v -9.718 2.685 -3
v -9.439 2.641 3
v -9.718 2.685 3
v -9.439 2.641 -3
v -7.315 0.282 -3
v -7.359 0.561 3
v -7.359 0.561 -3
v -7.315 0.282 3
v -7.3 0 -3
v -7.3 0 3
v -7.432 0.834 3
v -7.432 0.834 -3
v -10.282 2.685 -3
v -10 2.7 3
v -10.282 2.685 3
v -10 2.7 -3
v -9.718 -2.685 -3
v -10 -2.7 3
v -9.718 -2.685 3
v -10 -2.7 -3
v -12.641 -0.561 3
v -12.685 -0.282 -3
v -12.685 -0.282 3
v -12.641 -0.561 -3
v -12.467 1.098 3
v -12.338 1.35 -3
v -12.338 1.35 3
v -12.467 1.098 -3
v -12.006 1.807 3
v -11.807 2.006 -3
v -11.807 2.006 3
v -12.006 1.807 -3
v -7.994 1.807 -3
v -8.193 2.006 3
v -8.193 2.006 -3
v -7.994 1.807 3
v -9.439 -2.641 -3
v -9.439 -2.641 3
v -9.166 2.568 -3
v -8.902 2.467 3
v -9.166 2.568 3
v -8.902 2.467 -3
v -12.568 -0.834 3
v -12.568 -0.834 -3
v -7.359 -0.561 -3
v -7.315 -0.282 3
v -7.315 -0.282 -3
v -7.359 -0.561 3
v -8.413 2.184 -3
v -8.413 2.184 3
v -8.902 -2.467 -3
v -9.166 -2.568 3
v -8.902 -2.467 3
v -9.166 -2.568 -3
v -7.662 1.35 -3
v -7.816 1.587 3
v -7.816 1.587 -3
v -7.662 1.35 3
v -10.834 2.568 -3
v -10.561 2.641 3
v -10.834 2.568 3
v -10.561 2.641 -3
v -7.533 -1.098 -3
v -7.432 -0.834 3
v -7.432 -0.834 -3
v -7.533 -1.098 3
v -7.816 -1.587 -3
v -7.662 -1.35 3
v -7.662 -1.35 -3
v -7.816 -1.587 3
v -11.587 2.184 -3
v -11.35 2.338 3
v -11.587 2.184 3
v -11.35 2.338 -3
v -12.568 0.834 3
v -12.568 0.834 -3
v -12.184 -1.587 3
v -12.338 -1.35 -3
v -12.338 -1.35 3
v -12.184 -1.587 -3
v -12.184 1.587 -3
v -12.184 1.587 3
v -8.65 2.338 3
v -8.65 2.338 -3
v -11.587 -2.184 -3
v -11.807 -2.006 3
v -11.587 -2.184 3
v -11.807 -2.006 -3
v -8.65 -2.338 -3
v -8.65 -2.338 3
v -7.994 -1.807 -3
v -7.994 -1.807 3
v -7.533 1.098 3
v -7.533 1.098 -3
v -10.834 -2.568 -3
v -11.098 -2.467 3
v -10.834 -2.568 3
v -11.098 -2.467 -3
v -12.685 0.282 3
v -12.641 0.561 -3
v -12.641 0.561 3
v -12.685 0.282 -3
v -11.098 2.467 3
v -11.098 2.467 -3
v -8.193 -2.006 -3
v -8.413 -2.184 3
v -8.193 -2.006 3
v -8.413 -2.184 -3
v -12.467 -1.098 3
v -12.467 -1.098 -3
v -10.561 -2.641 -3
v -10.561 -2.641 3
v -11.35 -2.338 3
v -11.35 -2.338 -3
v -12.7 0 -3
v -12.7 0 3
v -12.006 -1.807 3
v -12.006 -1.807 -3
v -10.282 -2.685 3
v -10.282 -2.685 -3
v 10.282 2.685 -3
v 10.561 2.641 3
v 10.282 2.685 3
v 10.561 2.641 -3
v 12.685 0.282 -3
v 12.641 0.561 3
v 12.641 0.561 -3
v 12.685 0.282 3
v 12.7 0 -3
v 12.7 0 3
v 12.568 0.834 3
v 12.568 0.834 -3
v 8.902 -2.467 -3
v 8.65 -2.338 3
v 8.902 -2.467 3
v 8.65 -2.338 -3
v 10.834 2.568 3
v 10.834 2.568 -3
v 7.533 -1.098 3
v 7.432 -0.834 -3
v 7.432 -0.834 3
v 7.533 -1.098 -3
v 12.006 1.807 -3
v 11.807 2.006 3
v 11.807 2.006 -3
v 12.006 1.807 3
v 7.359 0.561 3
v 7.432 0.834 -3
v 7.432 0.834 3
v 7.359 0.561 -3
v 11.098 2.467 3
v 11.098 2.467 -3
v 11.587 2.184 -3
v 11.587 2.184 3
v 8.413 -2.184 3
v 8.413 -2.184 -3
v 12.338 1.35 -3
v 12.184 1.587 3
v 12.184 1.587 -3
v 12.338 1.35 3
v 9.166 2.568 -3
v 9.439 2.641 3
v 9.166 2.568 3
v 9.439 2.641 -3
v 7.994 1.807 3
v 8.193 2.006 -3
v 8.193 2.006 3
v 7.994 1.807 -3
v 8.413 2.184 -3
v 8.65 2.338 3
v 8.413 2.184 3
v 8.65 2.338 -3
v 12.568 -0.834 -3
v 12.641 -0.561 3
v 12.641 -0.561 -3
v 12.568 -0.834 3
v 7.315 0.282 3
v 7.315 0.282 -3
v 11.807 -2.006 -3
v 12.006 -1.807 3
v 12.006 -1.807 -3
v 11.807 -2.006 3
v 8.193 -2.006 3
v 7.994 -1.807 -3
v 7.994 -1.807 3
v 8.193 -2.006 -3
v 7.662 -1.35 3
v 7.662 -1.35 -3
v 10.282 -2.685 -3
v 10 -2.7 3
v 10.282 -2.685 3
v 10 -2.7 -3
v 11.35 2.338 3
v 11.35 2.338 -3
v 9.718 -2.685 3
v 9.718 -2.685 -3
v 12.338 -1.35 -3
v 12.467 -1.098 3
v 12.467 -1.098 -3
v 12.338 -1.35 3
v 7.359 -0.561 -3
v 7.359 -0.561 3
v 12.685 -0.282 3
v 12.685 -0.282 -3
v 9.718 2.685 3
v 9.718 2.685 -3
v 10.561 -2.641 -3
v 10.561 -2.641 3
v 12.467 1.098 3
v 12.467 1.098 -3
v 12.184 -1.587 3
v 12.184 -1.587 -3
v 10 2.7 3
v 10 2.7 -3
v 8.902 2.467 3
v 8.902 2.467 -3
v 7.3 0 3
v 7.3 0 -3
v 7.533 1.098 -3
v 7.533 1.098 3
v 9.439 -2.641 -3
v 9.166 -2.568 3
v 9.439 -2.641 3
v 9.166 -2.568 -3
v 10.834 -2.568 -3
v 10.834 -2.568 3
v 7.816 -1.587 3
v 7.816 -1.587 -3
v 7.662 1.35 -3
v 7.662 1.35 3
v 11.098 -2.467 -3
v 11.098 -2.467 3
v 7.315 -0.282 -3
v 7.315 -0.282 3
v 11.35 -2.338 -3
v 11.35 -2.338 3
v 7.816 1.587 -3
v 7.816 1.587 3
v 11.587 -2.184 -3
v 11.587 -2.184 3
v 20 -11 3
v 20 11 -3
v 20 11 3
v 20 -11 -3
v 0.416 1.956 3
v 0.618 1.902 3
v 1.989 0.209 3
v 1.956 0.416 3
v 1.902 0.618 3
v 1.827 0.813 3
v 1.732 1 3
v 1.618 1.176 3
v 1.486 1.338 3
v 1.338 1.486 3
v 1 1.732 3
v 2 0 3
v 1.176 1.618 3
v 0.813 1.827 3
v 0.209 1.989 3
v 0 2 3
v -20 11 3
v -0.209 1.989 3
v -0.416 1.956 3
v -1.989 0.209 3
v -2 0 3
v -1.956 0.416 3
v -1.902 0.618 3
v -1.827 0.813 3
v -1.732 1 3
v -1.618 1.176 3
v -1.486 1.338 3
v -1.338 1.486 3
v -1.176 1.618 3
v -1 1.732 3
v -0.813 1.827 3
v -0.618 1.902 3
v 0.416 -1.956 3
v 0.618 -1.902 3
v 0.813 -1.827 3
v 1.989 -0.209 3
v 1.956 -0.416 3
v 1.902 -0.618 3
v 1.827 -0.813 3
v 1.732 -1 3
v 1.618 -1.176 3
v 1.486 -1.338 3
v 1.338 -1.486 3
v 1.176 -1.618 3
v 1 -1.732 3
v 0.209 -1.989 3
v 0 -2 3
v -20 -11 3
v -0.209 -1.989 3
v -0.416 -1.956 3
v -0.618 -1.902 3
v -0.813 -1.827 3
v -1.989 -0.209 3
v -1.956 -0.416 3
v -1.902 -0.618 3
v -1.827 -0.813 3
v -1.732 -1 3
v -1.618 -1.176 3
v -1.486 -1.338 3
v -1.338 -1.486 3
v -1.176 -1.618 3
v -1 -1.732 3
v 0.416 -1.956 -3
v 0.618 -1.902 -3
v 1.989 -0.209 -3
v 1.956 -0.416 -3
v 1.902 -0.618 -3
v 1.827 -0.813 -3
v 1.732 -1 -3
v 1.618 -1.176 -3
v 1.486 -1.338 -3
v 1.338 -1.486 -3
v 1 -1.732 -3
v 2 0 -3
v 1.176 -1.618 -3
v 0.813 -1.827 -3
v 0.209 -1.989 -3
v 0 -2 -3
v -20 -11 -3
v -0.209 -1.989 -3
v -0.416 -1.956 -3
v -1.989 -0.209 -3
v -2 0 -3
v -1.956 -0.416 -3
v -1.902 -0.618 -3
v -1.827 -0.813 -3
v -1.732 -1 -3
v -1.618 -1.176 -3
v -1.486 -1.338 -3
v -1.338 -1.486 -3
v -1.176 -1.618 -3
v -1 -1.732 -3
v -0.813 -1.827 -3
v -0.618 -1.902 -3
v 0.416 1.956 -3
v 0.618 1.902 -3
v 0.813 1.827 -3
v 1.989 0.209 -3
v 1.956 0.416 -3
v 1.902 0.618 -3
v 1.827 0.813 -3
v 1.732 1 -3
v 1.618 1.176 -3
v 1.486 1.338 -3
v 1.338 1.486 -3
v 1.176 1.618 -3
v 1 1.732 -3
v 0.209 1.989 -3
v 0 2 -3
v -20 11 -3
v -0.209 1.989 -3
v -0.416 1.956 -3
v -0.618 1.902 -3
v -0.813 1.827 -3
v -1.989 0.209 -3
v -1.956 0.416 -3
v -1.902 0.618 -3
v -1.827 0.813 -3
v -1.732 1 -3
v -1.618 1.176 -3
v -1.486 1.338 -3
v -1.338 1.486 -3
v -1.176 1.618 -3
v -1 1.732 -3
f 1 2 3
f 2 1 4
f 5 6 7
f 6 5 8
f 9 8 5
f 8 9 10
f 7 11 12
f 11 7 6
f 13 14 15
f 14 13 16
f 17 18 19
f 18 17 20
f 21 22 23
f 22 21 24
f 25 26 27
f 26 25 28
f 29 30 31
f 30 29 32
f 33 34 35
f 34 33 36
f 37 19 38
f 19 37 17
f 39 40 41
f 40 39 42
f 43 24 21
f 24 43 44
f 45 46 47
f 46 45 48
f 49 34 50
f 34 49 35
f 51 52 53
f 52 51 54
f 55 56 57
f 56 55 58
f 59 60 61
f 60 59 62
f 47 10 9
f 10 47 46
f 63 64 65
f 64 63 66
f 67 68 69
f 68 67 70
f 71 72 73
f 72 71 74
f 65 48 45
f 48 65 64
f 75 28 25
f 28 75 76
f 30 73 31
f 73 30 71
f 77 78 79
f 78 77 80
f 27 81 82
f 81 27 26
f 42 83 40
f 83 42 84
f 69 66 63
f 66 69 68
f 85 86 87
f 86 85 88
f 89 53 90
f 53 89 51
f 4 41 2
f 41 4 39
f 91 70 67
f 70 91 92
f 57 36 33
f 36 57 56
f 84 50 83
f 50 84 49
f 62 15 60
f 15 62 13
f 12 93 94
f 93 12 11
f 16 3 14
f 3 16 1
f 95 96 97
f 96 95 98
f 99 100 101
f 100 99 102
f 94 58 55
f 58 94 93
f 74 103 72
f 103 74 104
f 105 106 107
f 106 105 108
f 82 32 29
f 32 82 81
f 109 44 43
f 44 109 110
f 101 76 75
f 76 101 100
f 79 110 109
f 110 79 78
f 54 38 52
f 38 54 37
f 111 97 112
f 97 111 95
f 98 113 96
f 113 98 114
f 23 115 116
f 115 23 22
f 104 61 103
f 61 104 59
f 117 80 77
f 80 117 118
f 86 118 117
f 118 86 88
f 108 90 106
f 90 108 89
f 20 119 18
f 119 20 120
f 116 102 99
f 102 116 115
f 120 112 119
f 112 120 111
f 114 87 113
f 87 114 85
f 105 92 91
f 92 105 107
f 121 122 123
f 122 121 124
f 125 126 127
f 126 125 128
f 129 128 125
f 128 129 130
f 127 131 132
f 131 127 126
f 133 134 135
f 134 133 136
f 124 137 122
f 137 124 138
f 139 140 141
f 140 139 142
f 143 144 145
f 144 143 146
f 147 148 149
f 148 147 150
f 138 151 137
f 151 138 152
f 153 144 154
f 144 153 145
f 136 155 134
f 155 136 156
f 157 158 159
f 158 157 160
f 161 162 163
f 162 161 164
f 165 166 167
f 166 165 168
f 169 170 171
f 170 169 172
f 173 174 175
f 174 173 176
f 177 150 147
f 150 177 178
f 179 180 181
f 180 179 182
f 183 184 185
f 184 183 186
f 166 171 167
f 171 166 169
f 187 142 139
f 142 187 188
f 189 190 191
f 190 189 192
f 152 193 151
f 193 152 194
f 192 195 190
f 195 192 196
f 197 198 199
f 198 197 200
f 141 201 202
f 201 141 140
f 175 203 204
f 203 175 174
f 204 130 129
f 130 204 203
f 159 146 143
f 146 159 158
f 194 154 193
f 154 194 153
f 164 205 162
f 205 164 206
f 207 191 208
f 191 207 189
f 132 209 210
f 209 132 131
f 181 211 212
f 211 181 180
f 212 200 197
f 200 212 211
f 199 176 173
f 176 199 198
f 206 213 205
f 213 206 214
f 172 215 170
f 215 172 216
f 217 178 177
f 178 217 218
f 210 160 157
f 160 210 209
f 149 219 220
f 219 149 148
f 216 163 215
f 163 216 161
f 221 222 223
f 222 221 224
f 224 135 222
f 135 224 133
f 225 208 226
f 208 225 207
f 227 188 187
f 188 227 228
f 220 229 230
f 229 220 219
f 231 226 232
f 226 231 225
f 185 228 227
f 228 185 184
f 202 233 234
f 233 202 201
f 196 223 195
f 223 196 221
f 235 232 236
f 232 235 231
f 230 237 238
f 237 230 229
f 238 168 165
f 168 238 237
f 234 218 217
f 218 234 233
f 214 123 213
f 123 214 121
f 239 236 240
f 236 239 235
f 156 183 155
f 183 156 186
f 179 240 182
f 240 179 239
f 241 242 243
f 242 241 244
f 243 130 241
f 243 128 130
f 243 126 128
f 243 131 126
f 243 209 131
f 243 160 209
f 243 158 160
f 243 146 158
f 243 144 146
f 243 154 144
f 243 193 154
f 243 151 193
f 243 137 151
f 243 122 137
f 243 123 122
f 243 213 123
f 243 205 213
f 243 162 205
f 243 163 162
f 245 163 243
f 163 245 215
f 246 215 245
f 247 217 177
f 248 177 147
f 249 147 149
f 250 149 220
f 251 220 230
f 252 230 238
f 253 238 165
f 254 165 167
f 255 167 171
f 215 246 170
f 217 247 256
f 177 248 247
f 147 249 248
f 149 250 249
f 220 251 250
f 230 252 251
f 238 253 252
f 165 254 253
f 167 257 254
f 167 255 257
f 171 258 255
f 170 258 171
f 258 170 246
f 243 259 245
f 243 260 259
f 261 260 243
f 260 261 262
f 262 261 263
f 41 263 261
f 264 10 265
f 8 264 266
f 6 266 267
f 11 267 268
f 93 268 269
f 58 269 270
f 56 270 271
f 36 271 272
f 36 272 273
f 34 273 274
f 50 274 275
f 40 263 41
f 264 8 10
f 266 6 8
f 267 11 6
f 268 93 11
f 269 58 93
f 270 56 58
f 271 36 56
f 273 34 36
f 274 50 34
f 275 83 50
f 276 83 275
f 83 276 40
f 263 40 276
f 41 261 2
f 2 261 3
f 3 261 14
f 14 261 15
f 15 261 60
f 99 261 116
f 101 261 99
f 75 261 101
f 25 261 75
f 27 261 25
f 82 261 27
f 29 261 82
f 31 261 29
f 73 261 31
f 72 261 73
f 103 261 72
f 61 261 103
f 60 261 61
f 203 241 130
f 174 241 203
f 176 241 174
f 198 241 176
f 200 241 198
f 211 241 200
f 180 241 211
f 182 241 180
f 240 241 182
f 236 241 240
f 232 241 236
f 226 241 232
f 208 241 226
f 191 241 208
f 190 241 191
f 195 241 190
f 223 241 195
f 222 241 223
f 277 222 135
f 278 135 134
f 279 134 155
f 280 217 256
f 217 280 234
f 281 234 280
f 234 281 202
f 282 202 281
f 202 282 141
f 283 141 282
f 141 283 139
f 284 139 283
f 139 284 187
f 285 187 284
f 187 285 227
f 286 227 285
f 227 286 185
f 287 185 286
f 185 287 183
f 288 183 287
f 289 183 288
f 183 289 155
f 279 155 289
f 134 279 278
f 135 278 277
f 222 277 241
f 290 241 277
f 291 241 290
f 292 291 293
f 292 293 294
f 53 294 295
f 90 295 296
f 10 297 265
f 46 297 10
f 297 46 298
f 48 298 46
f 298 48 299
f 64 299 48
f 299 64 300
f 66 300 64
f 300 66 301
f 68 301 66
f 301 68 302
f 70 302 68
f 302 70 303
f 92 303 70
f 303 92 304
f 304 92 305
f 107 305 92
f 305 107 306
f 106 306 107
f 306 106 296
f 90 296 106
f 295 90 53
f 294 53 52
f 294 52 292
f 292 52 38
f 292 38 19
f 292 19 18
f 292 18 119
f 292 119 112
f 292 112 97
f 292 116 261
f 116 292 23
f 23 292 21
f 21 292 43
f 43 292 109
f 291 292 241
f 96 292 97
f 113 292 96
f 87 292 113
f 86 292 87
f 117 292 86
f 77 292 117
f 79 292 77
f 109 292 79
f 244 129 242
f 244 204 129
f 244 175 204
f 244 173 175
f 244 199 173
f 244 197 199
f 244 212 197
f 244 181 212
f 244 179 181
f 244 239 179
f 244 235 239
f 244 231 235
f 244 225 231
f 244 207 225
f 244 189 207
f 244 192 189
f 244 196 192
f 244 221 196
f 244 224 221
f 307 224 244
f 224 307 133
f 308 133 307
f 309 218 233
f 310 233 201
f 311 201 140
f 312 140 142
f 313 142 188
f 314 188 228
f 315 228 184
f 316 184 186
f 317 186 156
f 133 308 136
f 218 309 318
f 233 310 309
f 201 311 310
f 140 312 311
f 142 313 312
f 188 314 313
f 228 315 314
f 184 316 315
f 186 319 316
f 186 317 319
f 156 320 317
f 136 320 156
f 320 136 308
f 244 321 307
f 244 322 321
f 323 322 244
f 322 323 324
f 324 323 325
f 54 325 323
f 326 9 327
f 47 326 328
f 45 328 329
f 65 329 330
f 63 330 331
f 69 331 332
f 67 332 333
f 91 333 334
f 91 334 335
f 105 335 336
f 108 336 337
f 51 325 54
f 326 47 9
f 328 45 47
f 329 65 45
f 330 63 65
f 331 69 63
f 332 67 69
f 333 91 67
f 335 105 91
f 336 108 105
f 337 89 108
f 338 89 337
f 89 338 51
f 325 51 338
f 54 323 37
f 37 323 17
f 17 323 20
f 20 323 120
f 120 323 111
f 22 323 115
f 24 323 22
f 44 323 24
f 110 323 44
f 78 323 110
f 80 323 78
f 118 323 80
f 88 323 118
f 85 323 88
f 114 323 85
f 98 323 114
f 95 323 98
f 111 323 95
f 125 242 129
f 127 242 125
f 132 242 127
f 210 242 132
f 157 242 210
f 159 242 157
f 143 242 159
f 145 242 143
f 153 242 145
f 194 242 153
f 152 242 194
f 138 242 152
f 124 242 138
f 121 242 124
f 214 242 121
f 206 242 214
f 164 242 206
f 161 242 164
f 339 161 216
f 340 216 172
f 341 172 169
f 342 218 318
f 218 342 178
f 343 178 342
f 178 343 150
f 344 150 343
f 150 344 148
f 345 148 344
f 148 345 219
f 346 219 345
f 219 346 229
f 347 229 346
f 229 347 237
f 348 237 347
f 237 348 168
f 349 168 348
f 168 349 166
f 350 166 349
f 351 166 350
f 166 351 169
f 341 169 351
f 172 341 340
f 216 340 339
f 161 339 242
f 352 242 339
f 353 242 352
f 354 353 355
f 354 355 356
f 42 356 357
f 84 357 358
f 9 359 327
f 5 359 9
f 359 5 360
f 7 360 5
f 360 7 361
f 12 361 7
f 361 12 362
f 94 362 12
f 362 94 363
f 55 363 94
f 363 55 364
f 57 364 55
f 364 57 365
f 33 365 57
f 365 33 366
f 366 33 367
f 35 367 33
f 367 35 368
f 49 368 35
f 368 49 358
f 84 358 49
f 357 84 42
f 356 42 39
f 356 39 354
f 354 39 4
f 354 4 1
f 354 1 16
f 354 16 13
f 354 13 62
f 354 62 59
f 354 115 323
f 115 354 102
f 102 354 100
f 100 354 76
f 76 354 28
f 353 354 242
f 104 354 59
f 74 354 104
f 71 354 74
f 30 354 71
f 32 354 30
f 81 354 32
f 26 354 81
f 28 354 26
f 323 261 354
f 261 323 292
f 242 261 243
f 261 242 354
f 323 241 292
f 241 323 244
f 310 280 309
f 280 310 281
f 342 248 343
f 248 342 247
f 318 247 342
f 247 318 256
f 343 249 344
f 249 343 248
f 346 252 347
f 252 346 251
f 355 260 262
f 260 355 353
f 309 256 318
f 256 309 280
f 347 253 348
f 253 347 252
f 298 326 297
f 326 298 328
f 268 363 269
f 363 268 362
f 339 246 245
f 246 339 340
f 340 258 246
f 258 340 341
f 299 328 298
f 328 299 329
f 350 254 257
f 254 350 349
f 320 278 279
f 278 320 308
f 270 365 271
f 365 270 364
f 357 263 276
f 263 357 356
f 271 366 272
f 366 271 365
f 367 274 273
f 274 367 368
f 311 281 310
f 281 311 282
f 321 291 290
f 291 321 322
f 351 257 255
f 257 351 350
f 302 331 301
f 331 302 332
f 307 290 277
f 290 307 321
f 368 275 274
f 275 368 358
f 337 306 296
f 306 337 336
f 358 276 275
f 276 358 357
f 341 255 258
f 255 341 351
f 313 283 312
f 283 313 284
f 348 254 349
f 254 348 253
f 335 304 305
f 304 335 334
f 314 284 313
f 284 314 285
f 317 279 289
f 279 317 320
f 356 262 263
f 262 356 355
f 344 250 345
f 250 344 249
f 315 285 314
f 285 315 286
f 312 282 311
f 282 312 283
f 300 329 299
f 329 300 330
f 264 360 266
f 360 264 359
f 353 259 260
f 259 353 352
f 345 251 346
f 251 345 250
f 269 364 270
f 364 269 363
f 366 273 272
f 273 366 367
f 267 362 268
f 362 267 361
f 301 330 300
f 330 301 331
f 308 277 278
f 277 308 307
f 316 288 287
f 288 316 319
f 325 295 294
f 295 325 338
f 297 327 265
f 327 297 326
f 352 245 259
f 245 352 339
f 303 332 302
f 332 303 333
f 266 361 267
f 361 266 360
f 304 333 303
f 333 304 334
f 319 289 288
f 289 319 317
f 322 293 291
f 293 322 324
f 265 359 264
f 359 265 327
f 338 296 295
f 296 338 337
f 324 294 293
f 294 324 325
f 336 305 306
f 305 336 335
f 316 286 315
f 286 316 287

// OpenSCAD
// Rod-end mounting plate.
$fn = 60;
eps = 0.02;
plate_l = 40;
plate_w = 22;
plate_t = 6;
bore_d = 4;
difference() {
    cube([plate_l, plate_w, plate_t], center = true);
    translate([0, 0, -plate_t / 2 - eps]) cylinder(d = bore_d, h = plate_t + 2 * eps);
    for (x = [-plate_l / 2 + 10, plate_l / 2 - 10])
        translate([x, 0, -plate_t / 2 - eps]) cylinder(d = 5.4, h = plate_t + 2 * eps);
}
